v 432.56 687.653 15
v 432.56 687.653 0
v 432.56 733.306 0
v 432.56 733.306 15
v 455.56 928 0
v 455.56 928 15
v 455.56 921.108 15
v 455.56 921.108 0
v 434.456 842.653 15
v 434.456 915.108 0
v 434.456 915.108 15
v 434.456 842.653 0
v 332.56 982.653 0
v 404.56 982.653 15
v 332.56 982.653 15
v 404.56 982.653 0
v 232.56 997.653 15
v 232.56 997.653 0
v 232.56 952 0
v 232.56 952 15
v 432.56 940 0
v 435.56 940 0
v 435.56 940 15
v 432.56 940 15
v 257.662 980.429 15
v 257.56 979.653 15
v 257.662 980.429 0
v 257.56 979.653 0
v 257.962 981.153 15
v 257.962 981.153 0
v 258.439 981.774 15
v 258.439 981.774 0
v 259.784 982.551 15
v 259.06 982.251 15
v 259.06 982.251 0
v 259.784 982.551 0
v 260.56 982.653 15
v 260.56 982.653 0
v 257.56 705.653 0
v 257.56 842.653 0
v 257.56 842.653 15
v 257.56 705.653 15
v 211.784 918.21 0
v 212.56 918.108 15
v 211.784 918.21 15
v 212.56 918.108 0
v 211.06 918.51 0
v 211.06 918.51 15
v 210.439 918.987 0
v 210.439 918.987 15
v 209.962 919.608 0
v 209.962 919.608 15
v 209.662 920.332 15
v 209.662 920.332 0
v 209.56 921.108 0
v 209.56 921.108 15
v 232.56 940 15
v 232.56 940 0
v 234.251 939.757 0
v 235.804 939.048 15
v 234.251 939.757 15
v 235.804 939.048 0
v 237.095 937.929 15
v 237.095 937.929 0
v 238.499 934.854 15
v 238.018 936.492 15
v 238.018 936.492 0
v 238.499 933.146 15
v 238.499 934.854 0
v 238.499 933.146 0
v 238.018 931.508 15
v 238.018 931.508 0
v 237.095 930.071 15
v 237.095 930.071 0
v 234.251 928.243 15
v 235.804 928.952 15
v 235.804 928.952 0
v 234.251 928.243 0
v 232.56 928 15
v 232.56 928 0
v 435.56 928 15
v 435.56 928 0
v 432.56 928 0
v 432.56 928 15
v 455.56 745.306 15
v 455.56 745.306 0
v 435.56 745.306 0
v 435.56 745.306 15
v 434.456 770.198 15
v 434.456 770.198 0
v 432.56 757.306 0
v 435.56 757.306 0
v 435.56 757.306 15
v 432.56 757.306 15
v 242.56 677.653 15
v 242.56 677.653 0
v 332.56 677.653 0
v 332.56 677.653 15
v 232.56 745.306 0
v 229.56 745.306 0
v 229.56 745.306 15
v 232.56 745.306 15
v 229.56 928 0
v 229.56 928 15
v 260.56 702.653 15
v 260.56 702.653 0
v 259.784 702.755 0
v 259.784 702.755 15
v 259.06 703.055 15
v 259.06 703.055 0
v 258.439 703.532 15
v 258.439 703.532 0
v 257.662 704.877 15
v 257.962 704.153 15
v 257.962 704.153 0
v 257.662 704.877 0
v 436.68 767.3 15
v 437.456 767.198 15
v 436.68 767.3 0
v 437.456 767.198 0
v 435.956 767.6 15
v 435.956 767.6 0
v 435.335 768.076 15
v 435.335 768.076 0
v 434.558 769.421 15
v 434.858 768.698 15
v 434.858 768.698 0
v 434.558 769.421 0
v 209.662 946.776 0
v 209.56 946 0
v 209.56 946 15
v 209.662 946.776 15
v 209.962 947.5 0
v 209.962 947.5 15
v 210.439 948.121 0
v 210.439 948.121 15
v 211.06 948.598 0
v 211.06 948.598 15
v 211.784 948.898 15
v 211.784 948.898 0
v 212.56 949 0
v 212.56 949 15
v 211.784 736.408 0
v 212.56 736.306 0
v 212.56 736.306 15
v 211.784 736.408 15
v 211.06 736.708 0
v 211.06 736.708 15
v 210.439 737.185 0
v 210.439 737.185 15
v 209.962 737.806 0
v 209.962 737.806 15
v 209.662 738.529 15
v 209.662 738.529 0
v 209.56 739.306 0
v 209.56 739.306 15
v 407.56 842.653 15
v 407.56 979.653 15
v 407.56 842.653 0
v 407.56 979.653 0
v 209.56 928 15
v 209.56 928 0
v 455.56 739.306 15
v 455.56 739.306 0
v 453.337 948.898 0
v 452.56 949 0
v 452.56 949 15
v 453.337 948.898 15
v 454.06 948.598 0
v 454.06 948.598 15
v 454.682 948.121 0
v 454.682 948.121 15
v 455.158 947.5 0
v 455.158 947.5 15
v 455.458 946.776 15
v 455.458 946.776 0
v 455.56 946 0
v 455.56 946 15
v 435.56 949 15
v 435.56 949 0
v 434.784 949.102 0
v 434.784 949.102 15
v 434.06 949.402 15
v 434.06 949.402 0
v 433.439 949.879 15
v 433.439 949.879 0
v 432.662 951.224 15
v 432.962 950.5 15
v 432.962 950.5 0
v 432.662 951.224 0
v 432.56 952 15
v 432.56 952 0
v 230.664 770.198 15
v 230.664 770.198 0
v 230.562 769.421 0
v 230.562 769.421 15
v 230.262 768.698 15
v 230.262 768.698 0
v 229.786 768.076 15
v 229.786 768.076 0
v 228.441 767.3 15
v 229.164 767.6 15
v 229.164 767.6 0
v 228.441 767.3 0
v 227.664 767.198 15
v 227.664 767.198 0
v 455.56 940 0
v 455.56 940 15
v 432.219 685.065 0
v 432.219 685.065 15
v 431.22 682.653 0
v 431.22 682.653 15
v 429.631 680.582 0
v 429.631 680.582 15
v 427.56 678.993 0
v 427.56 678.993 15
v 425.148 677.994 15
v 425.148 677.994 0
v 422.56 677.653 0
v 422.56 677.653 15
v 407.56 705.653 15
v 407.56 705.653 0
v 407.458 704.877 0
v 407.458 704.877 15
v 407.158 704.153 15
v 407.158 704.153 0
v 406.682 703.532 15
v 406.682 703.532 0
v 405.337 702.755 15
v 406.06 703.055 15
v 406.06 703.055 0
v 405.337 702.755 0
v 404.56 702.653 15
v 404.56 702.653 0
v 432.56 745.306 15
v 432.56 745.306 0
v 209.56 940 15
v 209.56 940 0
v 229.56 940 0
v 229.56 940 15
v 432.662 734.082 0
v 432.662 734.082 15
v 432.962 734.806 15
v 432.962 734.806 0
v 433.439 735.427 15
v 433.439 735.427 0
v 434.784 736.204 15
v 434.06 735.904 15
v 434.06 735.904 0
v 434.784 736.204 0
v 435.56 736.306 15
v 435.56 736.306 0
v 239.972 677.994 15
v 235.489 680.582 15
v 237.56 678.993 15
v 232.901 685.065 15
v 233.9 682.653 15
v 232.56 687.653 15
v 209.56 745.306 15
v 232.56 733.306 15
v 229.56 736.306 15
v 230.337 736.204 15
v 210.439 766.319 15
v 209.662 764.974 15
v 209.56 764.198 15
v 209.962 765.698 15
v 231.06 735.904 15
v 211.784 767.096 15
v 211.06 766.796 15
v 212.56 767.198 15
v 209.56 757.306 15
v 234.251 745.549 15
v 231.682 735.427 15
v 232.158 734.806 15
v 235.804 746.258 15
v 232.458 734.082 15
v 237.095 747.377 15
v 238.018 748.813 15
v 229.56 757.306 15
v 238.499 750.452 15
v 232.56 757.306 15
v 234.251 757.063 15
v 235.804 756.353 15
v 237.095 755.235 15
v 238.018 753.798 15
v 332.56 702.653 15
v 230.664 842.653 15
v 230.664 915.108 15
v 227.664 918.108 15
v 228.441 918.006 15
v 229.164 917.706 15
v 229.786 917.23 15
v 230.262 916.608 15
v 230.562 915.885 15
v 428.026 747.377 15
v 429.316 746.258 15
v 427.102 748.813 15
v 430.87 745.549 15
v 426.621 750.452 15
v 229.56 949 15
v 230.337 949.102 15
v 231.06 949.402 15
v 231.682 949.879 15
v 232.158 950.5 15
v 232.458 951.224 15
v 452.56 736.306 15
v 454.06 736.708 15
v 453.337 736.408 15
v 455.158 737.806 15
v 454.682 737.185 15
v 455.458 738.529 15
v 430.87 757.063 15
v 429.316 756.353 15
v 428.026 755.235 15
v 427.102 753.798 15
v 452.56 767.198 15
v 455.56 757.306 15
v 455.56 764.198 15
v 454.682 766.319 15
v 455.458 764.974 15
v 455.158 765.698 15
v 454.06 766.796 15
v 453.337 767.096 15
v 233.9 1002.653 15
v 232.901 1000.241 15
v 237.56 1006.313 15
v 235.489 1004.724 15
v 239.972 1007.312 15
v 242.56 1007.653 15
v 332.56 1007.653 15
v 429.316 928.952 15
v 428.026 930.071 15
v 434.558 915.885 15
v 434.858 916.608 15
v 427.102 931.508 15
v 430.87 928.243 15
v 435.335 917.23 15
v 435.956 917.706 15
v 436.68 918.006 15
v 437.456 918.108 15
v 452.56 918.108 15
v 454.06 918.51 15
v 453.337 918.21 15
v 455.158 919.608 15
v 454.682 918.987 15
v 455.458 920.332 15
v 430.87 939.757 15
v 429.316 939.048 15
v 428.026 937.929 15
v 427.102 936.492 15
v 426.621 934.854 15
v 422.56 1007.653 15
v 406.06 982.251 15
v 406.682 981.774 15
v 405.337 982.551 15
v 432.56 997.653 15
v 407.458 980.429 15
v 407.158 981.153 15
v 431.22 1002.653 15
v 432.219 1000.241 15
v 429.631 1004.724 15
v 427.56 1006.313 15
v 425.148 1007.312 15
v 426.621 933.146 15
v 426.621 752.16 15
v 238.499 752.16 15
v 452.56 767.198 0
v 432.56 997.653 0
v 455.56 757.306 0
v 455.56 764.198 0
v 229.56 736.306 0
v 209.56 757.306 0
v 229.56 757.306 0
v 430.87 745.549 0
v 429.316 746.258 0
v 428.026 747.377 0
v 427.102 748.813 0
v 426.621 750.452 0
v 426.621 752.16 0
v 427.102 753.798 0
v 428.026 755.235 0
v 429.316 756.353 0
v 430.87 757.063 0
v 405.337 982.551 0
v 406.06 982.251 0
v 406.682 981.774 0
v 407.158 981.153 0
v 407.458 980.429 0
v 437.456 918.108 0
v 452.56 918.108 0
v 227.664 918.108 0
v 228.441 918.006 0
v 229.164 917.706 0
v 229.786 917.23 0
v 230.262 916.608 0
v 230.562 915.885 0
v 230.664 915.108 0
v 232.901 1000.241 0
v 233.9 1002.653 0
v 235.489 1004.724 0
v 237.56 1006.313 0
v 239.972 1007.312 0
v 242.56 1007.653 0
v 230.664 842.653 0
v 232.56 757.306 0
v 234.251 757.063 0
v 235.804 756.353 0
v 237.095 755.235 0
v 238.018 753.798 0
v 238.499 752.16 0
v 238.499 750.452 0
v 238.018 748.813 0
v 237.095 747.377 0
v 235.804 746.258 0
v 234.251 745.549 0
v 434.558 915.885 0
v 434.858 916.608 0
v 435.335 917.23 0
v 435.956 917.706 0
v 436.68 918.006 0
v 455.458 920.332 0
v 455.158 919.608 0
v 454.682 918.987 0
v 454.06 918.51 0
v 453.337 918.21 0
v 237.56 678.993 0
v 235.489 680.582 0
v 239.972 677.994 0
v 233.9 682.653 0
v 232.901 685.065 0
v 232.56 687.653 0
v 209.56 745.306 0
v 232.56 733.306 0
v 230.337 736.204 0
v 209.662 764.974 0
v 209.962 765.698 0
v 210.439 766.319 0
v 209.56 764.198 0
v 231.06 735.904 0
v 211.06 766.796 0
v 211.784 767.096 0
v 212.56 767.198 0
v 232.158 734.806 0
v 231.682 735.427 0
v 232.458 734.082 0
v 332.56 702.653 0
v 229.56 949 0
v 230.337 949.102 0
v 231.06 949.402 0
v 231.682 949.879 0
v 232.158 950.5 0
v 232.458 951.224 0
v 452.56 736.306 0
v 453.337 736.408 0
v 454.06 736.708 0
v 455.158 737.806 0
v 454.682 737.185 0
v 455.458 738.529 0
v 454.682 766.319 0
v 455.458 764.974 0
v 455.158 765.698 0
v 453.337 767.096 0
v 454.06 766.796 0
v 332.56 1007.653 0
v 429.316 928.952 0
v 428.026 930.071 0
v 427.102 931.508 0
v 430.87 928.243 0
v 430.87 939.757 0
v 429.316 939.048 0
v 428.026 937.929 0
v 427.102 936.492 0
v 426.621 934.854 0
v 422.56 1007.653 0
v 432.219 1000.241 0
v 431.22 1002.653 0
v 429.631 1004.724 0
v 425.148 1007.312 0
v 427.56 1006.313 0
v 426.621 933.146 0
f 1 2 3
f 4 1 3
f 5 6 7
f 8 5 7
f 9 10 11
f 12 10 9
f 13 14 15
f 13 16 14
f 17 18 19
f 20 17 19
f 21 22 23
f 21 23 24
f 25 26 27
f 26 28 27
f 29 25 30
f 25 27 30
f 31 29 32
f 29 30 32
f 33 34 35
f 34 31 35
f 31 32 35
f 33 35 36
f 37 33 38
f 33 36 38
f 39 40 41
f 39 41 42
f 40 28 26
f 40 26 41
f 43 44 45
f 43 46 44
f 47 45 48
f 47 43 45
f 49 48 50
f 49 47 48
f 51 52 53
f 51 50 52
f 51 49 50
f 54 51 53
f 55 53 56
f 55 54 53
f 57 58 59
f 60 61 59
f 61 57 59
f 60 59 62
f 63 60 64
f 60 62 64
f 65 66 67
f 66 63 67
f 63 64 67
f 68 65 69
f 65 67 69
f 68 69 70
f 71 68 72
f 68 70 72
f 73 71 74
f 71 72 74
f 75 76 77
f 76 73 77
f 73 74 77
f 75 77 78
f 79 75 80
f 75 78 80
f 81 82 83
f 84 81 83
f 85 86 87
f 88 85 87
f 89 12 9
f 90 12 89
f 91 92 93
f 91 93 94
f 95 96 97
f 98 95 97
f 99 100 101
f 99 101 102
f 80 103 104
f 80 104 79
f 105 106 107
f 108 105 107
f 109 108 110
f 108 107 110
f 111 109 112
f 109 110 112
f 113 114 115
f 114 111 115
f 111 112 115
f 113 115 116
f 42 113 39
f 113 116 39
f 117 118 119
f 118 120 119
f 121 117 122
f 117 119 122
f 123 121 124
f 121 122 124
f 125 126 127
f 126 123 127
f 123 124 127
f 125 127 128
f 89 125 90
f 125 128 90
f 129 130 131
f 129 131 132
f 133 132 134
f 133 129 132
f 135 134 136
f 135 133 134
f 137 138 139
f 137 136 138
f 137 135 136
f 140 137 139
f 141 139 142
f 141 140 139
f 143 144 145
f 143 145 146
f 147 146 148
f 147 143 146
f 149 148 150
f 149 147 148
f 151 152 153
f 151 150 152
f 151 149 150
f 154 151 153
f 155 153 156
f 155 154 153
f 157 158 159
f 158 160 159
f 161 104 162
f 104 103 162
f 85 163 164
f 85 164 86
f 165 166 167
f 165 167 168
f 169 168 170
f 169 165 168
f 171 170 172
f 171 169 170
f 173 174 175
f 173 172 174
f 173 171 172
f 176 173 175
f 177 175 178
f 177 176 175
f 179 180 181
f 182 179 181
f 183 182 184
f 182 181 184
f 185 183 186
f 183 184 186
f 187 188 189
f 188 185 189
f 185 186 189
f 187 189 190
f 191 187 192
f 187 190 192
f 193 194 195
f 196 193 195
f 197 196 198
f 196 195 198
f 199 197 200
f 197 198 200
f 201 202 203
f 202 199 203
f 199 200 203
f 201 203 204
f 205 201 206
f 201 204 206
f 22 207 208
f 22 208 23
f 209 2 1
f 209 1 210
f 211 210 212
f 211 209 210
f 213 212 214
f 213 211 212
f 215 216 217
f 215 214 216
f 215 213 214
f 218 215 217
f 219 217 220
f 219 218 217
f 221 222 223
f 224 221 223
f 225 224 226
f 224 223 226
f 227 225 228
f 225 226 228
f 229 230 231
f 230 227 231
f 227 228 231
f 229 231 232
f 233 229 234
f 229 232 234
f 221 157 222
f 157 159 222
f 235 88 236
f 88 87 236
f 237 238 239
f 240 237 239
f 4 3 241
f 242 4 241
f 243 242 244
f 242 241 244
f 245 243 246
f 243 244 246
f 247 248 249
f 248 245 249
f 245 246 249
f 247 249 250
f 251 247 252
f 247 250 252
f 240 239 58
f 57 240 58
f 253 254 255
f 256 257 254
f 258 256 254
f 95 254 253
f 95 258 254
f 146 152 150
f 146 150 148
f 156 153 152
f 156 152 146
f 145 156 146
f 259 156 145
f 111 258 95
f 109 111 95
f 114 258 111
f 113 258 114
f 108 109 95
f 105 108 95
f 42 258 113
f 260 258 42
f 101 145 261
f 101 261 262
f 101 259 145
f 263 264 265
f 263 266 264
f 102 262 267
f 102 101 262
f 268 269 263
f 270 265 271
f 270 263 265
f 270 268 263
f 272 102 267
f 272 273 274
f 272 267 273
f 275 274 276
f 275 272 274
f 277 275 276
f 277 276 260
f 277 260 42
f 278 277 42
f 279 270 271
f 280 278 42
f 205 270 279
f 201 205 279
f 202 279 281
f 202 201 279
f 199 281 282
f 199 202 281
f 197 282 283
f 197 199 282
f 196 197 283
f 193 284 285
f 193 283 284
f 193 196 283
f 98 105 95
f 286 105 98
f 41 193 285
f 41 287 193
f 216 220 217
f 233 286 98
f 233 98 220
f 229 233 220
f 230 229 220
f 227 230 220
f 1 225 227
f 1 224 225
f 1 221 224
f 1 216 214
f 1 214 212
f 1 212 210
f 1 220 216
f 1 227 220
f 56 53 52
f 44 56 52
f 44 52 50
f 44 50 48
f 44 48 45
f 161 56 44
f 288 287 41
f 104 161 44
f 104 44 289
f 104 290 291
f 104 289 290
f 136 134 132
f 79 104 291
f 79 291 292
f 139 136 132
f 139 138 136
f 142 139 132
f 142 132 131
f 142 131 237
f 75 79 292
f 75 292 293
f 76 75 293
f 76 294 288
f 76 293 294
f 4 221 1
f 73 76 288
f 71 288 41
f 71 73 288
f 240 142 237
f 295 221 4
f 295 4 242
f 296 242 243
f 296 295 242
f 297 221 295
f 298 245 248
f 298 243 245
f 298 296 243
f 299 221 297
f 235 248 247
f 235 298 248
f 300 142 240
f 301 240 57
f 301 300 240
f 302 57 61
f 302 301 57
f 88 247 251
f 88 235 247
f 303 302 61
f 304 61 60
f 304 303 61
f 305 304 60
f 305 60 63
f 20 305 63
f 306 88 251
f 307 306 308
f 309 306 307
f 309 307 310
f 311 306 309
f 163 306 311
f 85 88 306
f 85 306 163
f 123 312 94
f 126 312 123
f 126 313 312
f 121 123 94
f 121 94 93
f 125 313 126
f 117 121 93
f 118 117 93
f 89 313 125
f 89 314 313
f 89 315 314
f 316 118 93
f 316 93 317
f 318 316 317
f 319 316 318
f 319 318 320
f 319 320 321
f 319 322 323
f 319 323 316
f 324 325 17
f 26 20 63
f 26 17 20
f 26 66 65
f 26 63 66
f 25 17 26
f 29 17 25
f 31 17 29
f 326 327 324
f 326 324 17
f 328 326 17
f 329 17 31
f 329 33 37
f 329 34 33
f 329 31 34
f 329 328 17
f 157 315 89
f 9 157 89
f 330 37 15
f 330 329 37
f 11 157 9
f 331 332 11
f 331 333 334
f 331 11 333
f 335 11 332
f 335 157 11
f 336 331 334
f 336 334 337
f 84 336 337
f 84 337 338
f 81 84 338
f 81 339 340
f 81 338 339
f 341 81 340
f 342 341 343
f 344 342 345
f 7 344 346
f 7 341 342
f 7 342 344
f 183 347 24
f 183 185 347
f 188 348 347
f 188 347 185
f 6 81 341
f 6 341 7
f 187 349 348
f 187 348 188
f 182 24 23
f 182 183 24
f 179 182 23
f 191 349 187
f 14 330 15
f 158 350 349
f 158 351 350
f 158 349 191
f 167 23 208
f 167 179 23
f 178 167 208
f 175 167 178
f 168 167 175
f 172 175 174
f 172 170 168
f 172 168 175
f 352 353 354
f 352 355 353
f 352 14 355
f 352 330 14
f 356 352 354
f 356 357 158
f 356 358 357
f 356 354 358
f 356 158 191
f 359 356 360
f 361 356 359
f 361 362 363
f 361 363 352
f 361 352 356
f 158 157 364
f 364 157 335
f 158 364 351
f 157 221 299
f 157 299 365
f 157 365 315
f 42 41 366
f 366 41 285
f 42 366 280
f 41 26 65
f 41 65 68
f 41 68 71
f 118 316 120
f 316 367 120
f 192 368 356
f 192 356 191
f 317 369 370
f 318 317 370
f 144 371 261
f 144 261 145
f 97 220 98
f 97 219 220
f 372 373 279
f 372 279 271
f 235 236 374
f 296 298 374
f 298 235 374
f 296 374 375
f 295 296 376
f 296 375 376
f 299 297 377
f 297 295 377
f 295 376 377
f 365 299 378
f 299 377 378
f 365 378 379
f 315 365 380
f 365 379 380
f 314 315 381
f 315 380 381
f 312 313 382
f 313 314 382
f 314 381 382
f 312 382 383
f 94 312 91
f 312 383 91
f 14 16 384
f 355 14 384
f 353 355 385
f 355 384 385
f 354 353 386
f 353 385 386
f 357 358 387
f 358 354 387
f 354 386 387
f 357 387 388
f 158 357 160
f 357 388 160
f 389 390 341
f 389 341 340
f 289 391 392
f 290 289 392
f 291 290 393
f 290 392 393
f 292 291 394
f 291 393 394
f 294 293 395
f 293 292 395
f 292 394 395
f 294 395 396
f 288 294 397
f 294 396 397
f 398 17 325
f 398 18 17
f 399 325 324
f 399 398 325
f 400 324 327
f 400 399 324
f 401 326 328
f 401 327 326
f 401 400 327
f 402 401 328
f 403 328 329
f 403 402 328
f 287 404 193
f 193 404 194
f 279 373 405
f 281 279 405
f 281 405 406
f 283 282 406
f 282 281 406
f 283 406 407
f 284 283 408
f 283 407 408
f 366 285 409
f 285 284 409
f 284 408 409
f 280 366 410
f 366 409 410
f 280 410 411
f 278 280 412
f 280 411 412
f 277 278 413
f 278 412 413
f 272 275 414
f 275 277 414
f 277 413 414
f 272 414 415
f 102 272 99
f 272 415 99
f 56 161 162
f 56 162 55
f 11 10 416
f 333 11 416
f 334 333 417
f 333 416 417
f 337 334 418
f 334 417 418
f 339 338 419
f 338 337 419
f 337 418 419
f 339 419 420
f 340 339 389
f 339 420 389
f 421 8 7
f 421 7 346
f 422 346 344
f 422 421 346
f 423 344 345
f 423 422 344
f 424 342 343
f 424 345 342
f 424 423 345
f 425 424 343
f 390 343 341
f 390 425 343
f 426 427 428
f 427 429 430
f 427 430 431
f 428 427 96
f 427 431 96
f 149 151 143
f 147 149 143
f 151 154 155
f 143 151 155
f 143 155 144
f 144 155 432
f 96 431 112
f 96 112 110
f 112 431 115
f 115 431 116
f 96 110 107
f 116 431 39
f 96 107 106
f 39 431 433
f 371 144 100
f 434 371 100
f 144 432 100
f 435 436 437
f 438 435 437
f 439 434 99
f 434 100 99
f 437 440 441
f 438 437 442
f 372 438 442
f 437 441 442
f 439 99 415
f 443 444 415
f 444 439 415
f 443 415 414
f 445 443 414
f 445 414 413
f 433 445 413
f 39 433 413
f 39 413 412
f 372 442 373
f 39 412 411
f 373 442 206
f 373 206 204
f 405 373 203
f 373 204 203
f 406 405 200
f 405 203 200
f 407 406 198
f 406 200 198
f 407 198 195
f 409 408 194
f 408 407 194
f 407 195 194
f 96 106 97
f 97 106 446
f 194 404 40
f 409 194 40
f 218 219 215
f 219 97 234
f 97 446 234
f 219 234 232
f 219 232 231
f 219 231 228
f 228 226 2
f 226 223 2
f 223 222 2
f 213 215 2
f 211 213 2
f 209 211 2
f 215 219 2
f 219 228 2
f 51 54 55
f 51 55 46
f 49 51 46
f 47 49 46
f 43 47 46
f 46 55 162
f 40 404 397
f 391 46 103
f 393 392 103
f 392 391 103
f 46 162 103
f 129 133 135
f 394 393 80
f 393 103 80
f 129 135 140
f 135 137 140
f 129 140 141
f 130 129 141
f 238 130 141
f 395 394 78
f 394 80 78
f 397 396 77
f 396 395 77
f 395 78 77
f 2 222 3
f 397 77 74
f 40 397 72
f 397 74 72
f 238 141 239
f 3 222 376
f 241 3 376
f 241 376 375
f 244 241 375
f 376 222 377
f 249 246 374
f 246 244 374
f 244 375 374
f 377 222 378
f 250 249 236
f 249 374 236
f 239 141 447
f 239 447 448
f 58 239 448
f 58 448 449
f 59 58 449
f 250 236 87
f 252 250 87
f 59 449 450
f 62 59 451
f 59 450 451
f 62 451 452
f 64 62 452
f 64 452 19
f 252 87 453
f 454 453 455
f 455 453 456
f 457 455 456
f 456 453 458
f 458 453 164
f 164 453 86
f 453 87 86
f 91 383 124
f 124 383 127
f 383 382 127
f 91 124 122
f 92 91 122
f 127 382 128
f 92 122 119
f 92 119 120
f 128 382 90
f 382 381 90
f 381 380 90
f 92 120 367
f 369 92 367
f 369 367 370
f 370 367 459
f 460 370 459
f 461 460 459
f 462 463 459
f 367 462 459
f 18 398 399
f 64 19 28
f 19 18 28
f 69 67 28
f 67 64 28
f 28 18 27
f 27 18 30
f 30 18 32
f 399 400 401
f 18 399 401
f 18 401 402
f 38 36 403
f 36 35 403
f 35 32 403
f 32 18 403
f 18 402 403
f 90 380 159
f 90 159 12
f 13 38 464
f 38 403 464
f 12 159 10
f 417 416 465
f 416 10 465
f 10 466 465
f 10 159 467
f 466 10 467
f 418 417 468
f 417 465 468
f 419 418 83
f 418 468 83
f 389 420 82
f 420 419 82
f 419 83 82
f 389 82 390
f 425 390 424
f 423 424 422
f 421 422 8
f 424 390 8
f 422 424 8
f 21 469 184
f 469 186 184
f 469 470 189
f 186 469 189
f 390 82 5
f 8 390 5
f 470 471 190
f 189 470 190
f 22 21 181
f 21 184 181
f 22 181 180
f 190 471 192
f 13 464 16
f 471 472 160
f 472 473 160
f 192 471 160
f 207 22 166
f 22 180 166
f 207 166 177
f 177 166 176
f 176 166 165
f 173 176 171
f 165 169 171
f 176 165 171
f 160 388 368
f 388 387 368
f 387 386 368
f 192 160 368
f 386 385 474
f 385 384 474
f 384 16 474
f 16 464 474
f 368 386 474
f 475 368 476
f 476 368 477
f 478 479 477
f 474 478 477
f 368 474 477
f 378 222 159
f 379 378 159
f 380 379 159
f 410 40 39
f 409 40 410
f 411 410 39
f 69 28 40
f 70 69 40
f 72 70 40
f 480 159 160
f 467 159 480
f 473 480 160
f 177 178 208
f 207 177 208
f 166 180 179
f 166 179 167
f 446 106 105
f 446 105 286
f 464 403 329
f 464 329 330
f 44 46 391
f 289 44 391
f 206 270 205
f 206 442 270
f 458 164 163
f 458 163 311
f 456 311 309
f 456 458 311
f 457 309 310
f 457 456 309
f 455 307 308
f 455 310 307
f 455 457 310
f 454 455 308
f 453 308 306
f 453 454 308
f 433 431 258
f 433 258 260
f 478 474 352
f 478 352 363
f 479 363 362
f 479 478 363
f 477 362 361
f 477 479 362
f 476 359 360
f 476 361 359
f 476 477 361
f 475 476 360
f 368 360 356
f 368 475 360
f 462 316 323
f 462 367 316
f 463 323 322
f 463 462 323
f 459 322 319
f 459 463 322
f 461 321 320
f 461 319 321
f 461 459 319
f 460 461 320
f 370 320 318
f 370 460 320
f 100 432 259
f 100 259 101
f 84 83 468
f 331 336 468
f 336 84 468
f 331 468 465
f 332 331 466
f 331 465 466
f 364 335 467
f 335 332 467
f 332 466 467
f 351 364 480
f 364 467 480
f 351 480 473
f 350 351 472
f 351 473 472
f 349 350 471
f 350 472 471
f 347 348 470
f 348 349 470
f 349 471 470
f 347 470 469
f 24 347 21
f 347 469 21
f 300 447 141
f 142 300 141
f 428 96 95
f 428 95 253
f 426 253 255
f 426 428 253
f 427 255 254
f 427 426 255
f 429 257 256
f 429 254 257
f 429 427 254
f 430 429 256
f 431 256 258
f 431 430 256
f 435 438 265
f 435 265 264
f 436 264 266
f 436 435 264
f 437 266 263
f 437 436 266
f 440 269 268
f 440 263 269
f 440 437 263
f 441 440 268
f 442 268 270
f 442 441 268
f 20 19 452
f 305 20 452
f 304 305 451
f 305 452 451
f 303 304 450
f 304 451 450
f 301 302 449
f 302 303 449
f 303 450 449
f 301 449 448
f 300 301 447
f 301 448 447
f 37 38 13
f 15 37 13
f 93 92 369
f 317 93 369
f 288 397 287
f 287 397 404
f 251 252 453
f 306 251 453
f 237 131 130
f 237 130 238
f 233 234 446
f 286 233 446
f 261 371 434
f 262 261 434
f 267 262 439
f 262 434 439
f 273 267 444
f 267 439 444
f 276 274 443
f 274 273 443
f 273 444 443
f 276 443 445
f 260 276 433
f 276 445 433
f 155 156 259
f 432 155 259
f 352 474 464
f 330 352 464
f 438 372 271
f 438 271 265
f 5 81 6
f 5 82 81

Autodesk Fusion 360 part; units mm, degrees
sketch "Sketch1" plane through (0, 0, 0) normal (0, 0, 1) x (1, 0, 0)
  line L0 (242.5602, 1007.653) -> (332.5602, 1007.653)
  line L1 (232.5602, 997.653) -> (232.5602, 952)
  line L2 (229.5602, 949) -> (212.5602, 949)
  line L3 (209.5602, 946) -> (209.5602, 940)
  line L4 (209.5602, 940) -> (229.5602, 940)
  arc A0 (242.5602, 1007.653) -> (232.5602, 997.653) centre (242.5602, 997.653) ccw
  line L5 (260.5602, 982.653) -> (332.5602, 982.653)
  line L6 (229.5602, 928) -> (209.5602, 928)
  line L7 (209.5602, 928) -> (209.5602, 921.1082)
  line L8 (212.5602, 918.1082) -> (227.6643, 918.1082)
  line L9 (229.5602, 940) -> (232.5602, 940)
  line L10 (229.5602, 928) -> (232.5602, 928)
  arc A1 (232.5602, 928) -> (232.5602, 940) centre (232.5602, 934) ccw
  line L11 (230.6643, 915.1082) -> (230.6643, 842.653)
  line L12 (257.5602, 979.653) -> (257.5602, 842.653)
  arc A2 (229.5602, 949) -> (232.5602, 952) centre (229.5602, 952) ccw
  arc A3 (230.6643, 915.1082) -> (227.6643, 918.1082) centre (227.6643, 915.1082) ccw
  arc A4 (212.5602, 949) -> (209.5602, 946) centre (212.5602, 946) ccw
  arc A5 (209.5602, 921.1082) -> (212.5602, 918.1082) centre (212.5602, 921.1082) ccw
  line L13 (435.5602, 949) -> (452.5602, 949)
  arc A6 (432.5602, 940) -> (432.5602, 928) centre (432.5602, 934) ccw
  line L14 (435.5602, 928) -> (432.5602, 928)
  line L15 (407.5602, 979.653) -> (407.5602, 842.653)
  line L16 (434.4561, 915.1082) -> (434.4561, 842.653)
  arc A7 (432.5602, 952) -> (435.5602, 949) centre (435.5602, 952) ccw
  line L17 (452.5602, 918.1082) -> (437.4561, 918.1082)
  arc A8 (432.5602, 997.653) -> (422.5602, 1007.653) centre (422.5602, 997.653) ccw
  line L18 (435.5602, 940) -> (432.5602, 940)
  arc A9 (437.4561, 918.1082) -> (434.4561, 915.1082) centre (437.4561, 915.1082) ccw
  arc A10 (452.5602, 918.1082) -> (455.5602, 921.1082) centre (452.5602, 921.1082) ccw
  line L19 (455.5602, 940) -> (435.5602, 940)
  line L20 (455.5602, 946) -> (455.5602, 940)
  line L21 (455.5602, 928) -> (455.5602, 921.1082)
  line L22 (422.5602, 1007.653) -> (332.5602, 1007.653)
  line L23 (404.5602, 982.653) -> (332.5602, 982.653)
  line L24 (432.5602, 997.653) -> (432.5602, 952)
  line L25 (435.5602, 928) -> (455.5602, 928)
  arc A11 (455.5602, 946) -> (452.5602, 949) centre (452.5602, 946) ccw
  line L26 (435.5602, 757.3059) -> (432.5602, 757.3059)
  line L27 (232.5602, 687.653) -> (232.5602, 733.3059)
  arc A12 (227.6643, 767.1978) -> (230.6643, 770.1978) centre (227.6643, 770.1978) ccw
  arc A13 (435.5602, 736.3059) -> (432.5602, 733.3059) centre (435.5602, 733.3059) ccw
  line L28 (212.5602, 767.1978) -> (227.6643, 767.1978)
  line L29 (455.5602, 757.3059) -> (455.5602, 764.1978)
  line L30 (229.5602, 757.3059) -> (232.5602, 757.3059)
  line L31 (435.5602, 736.3059) -> (452.5602, 736.3059)
  arc A14 (422.5602, 677.653) -> (432.5602, 687.653) centre (422.5602, 687.653) ccw
  line L32 (209.5602, 745.3059) -> (229.5602, 745.3059)
  arc A15 (209.5602, 739.3059) -> (212.5602, 736.3059) centre (212.5602, 739.3059) ccw
  arc A16 (232.5602, 733.3059) -> (229.5602, 736.3059) centre (229.5602, 733.3059) ccw
  arc A17 (232.5602, 687.653) -> (242.5602, 677.653) centre (242.5602, 687.653) ccw
  line L33 (455.5602, 739.3059) -> (455.5602, 745.3059)
  arc A18 (455.5602, 764.1978) -> (452.5602, 767.1978) centre (452.5602, 764.1978) ccw
  line L34 (209.5602, 757.3059) -> (209.5602, 764.1978)
  line L35 (229.5602, 745.3059) -> (232.5602, 745.3059)
  line L36 (209.5602, 739.3059) -> (209.5602, 745.3059)
  arc A19 (432.5602, 757.3059) -> (432.5602, 745.3059) centre (432.5602, 751.3059) ccw
  line L37 (455.5602, 745.3059) -> (435.5602, 745.3059)
  arc A20 (434.4561, 770.1978) -> (437.4561, 767.1978) centre (437.4561, 770.1978) ccw
  line L38 (435.5602, 757.3059) -> (455.5602, 757.3059)
  line L39 (432.5602, 687.653) -> (432.5602, 733.3059)
  line L40 (452.5602, 767.1978) -> (437.4561, 767.1978)
  line L41 (435.5602, 745.3059) -> (432.5602, 745.3059)
  arc A21 (452.5602, 736.3059) -> (455.5602, 739.3059) centre (452.5602, 739.3059) ccw
  arc A22 (212.5602, 767.1978) -> (209.5602, 764.1978) centre (212.5602, 764.1978) ccw
  line L42 (229.5602, 736.3059) -> (212.5602, 736.3059)
  line L43 (260.5602, 702.653) -> (332.5602, 702.653)
  line L44 (404.5602, 702.653) -> (332.5602, 702.653)
  arc A23 (232.5602, 745.3059) -> (232.5602, 757.3059) centre (232.5602, 751.3059) ccw
  line L45 (242.5602, 677.653) -> (332.5602, 677.653)
  line L46 (422.5602, 677.653) -> (332.5602, 677.653)
  line L47 (229.5602, 757.3059) -> (209.5602, 757.3059)
  line L48 (230.6643, 842.653) -> (230.6643, 770.1978)
  line L49 (257.5602, 842.653) -> (257.5602, 705.653)
  line L50 (407.5602, 842.653) -> (407.5602, 705.653)
  line L51 (434.4561, 842.653) -> (434.4561, 770.1978)
  arc A24 (407.5602, 979.653) -> (404.5602, 982.653) centre (404.5602, 979.653) ccw
  arc A25 (404.5602, 702.653) -> (407.5602, 705.653) centre (404.5602, 705.653) ccw
  arc A26 (260.5602, 982.653) -> (257.5602, 979.653) centre (260.5602, 979.653) ccw
  arc A27 (257.5602, 705.653) -> (260.5602, 702.653) centre (260.5602, 705.653) ccw
  point P0 (750, 0)
  point P1 (232.5602, 1007.653)
  point P2 (432.5602, 1007.653)
  point P3 (232.5602, 677.653)
  point P4 (432.5602, 677.653)
  dimension "d18" = 10
  dimension "d28" = 25
  dimension "d59" = 3
  dimension "d60" = 3
  dimension "d61" = 3
  dimension "d62" = 3
  dimension "d63" = 3
  dimension "d64" = 3
  dimension "d65" = 3
  dimension "d66" = 3
extrude "Extrude1" add sketch "Sketch1" along normal blind 15
